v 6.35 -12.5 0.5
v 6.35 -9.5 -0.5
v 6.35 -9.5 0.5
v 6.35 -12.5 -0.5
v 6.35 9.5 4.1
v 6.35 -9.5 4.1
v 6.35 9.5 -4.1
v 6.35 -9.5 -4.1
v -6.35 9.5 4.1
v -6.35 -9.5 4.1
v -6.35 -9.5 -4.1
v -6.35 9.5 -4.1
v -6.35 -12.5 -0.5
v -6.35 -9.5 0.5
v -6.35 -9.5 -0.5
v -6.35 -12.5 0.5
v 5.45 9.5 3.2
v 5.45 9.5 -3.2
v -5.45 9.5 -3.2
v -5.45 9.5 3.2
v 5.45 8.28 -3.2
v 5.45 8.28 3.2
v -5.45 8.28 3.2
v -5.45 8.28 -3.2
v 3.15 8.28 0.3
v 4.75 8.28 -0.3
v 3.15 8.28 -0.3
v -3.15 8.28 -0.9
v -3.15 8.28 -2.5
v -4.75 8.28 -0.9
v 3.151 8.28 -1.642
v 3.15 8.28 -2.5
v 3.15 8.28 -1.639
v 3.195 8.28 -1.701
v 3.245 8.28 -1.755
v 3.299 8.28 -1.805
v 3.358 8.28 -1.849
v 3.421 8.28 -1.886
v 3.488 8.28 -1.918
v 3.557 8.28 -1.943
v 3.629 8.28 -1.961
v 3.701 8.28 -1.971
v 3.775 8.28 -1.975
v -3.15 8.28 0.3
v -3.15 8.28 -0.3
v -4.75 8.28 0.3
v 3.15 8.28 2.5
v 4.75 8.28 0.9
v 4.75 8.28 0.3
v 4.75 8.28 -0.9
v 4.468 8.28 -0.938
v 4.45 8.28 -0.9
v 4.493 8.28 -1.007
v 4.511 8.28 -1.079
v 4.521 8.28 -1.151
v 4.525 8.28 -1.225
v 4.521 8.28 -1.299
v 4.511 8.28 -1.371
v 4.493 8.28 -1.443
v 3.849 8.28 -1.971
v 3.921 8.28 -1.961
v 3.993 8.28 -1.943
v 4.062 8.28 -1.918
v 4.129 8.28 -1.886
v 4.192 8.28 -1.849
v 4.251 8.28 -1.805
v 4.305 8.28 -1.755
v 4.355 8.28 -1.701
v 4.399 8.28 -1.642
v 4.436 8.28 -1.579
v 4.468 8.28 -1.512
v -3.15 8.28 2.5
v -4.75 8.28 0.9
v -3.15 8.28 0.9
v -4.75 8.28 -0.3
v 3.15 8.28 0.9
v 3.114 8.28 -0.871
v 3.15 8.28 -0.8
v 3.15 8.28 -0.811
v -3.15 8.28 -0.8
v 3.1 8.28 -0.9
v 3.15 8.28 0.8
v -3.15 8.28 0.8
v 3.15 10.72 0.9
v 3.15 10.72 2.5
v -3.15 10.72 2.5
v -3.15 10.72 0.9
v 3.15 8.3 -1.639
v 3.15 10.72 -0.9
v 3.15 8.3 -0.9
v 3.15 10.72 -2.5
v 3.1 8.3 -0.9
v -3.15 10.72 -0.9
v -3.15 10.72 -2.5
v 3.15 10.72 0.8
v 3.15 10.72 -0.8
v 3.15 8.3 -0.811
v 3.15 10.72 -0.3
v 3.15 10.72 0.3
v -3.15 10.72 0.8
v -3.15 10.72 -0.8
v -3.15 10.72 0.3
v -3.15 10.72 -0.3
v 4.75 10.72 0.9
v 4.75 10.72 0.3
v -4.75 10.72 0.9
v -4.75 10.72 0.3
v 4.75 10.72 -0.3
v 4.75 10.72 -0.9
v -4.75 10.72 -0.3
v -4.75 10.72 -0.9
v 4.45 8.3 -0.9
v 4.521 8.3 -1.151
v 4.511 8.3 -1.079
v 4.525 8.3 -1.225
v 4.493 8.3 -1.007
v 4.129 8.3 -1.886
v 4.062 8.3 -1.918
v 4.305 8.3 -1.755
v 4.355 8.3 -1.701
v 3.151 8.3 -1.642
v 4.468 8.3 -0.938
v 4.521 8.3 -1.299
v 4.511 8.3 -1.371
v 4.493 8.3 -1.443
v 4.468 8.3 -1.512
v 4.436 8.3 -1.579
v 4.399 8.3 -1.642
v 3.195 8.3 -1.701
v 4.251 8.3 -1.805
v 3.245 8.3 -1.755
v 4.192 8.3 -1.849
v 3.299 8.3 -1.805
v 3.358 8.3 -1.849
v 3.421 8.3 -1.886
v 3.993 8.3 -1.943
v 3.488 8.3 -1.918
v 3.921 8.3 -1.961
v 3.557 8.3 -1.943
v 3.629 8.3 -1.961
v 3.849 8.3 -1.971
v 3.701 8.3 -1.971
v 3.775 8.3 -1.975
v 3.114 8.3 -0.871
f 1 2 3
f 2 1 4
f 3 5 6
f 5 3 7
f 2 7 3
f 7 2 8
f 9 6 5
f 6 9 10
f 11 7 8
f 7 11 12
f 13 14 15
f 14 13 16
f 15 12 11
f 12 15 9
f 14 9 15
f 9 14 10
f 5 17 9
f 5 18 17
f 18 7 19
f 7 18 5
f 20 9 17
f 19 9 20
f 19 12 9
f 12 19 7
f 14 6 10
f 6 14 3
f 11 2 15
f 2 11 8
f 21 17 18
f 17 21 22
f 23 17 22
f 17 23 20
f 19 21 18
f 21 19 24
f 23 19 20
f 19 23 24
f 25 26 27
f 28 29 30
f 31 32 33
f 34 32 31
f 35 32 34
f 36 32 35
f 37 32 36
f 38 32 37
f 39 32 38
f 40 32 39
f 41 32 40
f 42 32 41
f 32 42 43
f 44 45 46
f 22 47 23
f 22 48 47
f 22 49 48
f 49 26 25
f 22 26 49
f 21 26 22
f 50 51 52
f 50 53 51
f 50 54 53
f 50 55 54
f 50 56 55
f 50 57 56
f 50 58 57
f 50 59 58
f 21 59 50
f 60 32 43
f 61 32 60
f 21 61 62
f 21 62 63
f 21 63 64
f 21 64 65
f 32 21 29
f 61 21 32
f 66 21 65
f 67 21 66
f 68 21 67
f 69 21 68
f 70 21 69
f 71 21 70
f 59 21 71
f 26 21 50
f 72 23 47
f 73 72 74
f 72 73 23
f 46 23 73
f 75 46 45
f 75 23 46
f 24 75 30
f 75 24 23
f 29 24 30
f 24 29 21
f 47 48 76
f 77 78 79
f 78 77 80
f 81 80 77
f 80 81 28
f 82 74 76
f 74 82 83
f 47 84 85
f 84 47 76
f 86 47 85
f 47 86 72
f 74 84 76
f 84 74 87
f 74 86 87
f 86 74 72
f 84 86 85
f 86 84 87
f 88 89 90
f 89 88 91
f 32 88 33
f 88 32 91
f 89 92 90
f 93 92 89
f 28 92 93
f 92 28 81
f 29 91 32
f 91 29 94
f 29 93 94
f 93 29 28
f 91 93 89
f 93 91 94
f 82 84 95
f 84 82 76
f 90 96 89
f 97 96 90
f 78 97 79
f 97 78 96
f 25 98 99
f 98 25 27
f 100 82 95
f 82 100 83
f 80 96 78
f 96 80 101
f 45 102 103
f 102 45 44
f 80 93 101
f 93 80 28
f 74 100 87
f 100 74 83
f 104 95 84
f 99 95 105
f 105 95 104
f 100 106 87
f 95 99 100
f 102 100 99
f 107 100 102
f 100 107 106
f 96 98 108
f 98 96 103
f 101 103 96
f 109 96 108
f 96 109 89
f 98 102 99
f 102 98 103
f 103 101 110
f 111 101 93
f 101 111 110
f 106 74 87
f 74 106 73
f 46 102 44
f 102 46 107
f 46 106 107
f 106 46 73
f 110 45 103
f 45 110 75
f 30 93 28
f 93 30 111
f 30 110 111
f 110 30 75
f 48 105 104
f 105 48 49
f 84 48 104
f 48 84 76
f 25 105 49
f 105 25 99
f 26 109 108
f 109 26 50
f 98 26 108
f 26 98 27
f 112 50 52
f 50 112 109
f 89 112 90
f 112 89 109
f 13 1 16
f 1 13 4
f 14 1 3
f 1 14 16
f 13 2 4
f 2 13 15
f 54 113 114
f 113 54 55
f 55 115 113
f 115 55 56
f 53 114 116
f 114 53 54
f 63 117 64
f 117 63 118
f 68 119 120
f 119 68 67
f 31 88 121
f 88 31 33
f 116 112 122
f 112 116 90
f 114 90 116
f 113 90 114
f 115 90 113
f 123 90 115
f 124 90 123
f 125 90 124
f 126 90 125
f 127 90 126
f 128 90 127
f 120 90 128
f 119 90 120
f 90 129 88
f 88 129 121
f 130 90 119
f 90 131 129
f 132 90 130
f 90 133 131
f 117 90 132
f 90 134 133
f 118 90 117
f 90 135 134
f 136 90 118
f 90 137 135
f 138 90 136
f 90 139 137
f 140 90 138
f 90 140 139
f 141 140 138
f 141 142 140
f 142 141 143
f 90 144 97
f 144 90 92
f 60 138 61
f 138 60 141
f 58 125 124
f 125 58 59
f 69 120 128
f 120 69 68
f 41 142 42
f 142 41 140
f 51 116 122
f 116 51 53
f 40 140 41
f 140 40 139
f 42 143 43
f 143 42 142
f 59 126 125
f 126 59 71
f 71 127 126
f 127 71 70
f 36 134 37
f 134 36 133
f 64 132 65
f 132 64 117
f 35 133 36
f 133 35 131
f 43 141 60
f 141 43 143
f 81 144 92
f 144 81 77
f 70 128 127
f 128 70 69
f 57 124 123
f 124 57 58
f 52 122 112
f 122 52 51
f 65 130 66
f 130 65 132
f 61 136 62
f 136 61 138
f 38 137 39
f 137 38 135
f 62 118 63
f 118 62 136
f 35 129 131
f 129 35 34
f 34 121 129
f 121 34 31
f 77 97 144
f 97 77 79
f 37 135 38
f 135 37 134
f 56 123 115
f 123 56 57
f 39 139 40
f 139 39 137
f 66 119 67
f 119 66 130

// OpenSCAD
// 7-segment display (single connected solid)
// Overall dimensions (X,Y,Z) = [12.7, 19, 8.2]
// Fix: Make the front face clearly show a classic 7-segment layout by
// ADDING raised segment bars on the front (recognizable silhouette),
// while keeping everything as ONE connected solid and preserving overall size.

$fn = 64;

// Overall size
display_width  = 12.7;  // X
display_height = 19.0;  // Y (front-back)
display_depth  = 8.2;   // Z (bottom-top)

// Front bezel + recessed window (kept, but not relied upon for visibility)
bezel_thickness = 0.9;
recess_depth    = 1.2;

// Segment geometry (raised on front face for clear 7-seg look)
seg_w     = 1.6;   // segment stroke width (X/Z)
seg_gap   = 0.7;   // gap to window edges
seg_raise = 1.2;   // how far segments protrude from front face (+Y)
seg_overlap = 1.2; // overlap into body for robust union (1-2mm)

// Decimal point (optional, raised)
dp_d      = 1.5;
dp_raise  = seg_raise;

// Pins (kept connected by a rear carrier bar so the model is ONE connected solid)
pin_d        = 0.8;
pin_len      = 3.0;      // extends out the back (negative Y)
pin_spacing  = 2.54;
pin_count    = 4;
pin_bar_h    = 1.0;      // thickness of carrier bar (Z)
pin_overlap  = 1.2;      // overlap into body for robust union (1-2mm requested)

// Robust overlap / numerical epsilon
eps = 0.02;

// Helpers
function clamp(v, lo, hi) = v < lo ? lo : (v > hi ? hi : v);

// Coordinate convention:
// X = width (left-right), Y = height (front-back), Z = depth (bottom-top)
// Body centered at origin. Front face at +Y, back face at -Y.

module body_base() {
    translate([-display_width/2, -display_height/2, -display_depth/2])
        cube([display_width, display_height, display_depth], center=false);
}

module front_recess_cut() {
    // Cut a window recess from the FRONT face (+Y) inward by recess_depth.
    x0 = -display_width/2  + bezel_thickness;
    z0 = -display_depth/2  + bezel_thickness;
    w  =  display_width    - 2*bezel_thickness;
    h  =  display_depth    - 2*bezel_thickness;

    y0 =  display_height/2 - recess_depth;

    translate([x0, y0 - eps, z0])
        cube([w, recess_depth + 2*eps, h], center=false);
}

// --- Raised segment bars (for recognizability) ---
module seg_bar(x, z, w, h) {
    // Place a bar so it overlaps INTO the body by seg_overlap and protrudes by seg_raise.
    // Front face is at y = +display_height/2.
    y_front = display_height/2;
    y0 = y_front - seg_overlap;                 // start inside body
    y_len = seg_overlap + seg_raise;            // extend outwards

    translate([x, y0 - eps, z])
        cube([w, y_len + 2*eps, h], center=false);
}

module segments_7_raised() {
    // Use the same window bounds in X/Z as the recess, so layout is consistent.
    wx0 = -display_width/2  + bezel_thickness;
    wz0 = -display_depth/2  + bezel_thickness;
    ww  =  display_width    - 2*bezel_thickness;
    wh  =  display_depth    - 2*bezel_thickness;

    // Inner usable area for segments
    ix0 = wx0 + seg_gap;
    iz0 = wz0 + seg_gap;
    iw  = ww  - 2*seg_gap;
    ih  = wh  - 2*seg_gap;

    // Horizontal segment length
    hlen = clamp(iw - 2*seg_w, 0.6, iw);

    // Vertical segment height (top and bottom halves)
    vhalf = clamp((ih - 3*seg_w) / 2, 0.6, ih);

    // Z positions for horizontal segments
    z_top    = iz0 + ih - seg_w;
    z_mid    = iz0 + (ih - seg_w)/2;
    z_bottom = iz0;

    // a (top)
    seg_bar(ix0 + seg_w, z_top,    hlen, seg_w);
    // d (bottom)
    seg_bar(ix0 + seg_w, z_bottom, hlen, seg_w);
    // g (middle)
    seg_bar(ix0 + seg_w, z_mid,    hlen, seg_w);

    // f (upper-left)
    seg_bar(ix0, iz0 + ih - seg_w - vhalf, seg_w, vhalf);
    // e (lower-left)
    seg_bar(ix0, iz0 + seg_w,              seg_w, vhalf);

    // b (upper-right)
    seg_bar(ix0 + iw - seg_w, iz0 + ih - seg_w - vhalf, seg_w, vhalf);
    // c (lower-right)
    seg_bar(ix0 + iw - seg_w, iz0 + seg_w,              seg_w, vhalf);
}

module decimal_point_raised() {
    // Raised dot near bottom-right inside the window.
    wx0 = -display_width/2  + bezel_thickness;
    wz0 = -display_depth/2  + bezel_thickness;
    ww  =  display_width    - 2*bezel_thickness;
    wh  =  display_depth    - 2*bezel_thickness;

    ix0 = wx0 + seg_gap;
    iz0 = wz0 + seg_gap;
    iw  = ww  - 2*seg_gap;

    x = ix0 + iw - dp_d*1.15;
    z = iz0 + dp_d*0.35;

    y_front = display_height/2;
    y0 = y_front - seg_overlap;                 // overlap into body
    y_len = seg_overlap + dp_raise;

    translate([x + dp_d/2, y0, z + dp_d/2])
        rotate([90, 0, 0])
            cylinder(h=y_len, d=dp_d, center=false);
}

module pins_connected() {
    // Pins extend out the BACK (negative Y), connected via a carrier bar that overlaps the body.
    total_span = (pin_count - 1) * pin_spacing;
    x_start = -total_span/2;

    // Back face is at -display_height/2
    y_back = -display_height/2;

    // Carrier bar: spans full width, extends outward by pin_len, overlaps into body by pin_overlap
    bar_y0  = y_back - pin_len;      // outer end
    bar_y1  = y_back + pin_overlap;  // overlaps into body
    bar_len = bar_y1 - bar_y0;

    // Place bar centered in Z, sitting at bottom half (simple)
    translate([-display_width/2, bar_y0, -pin_bar_h/2])
        cube([display_width, bar_len, pin_bar_h], center=false);

    // Pins: cylinders along Y, starting inside body for robust union
    for (i = [0:pin_count-1]) {
        x = x_start + i*pin_spacing;
        y_pin0 = y_back + pin_overlap; // start inside body
        translate([x, y_pin0, 0])
            rotate([90, 0, 0])
                cylinder(h=pin_len + pin_overlap, d=pin_d, center=false);
    }
}

module seven_segment_display() {
    union() {
        // Main body with a subtle front recess (kept)
        difference() {
            body_base();
            front_recess_cut();
        }

        // Raised segments on the front face (clear 7-seg appearance)
        segments_7_raised();
        decimal_point_raised();

        // Rear pins assembly (connected via overlap)
        pins_connected();
    }
}

seven_segment_display();
